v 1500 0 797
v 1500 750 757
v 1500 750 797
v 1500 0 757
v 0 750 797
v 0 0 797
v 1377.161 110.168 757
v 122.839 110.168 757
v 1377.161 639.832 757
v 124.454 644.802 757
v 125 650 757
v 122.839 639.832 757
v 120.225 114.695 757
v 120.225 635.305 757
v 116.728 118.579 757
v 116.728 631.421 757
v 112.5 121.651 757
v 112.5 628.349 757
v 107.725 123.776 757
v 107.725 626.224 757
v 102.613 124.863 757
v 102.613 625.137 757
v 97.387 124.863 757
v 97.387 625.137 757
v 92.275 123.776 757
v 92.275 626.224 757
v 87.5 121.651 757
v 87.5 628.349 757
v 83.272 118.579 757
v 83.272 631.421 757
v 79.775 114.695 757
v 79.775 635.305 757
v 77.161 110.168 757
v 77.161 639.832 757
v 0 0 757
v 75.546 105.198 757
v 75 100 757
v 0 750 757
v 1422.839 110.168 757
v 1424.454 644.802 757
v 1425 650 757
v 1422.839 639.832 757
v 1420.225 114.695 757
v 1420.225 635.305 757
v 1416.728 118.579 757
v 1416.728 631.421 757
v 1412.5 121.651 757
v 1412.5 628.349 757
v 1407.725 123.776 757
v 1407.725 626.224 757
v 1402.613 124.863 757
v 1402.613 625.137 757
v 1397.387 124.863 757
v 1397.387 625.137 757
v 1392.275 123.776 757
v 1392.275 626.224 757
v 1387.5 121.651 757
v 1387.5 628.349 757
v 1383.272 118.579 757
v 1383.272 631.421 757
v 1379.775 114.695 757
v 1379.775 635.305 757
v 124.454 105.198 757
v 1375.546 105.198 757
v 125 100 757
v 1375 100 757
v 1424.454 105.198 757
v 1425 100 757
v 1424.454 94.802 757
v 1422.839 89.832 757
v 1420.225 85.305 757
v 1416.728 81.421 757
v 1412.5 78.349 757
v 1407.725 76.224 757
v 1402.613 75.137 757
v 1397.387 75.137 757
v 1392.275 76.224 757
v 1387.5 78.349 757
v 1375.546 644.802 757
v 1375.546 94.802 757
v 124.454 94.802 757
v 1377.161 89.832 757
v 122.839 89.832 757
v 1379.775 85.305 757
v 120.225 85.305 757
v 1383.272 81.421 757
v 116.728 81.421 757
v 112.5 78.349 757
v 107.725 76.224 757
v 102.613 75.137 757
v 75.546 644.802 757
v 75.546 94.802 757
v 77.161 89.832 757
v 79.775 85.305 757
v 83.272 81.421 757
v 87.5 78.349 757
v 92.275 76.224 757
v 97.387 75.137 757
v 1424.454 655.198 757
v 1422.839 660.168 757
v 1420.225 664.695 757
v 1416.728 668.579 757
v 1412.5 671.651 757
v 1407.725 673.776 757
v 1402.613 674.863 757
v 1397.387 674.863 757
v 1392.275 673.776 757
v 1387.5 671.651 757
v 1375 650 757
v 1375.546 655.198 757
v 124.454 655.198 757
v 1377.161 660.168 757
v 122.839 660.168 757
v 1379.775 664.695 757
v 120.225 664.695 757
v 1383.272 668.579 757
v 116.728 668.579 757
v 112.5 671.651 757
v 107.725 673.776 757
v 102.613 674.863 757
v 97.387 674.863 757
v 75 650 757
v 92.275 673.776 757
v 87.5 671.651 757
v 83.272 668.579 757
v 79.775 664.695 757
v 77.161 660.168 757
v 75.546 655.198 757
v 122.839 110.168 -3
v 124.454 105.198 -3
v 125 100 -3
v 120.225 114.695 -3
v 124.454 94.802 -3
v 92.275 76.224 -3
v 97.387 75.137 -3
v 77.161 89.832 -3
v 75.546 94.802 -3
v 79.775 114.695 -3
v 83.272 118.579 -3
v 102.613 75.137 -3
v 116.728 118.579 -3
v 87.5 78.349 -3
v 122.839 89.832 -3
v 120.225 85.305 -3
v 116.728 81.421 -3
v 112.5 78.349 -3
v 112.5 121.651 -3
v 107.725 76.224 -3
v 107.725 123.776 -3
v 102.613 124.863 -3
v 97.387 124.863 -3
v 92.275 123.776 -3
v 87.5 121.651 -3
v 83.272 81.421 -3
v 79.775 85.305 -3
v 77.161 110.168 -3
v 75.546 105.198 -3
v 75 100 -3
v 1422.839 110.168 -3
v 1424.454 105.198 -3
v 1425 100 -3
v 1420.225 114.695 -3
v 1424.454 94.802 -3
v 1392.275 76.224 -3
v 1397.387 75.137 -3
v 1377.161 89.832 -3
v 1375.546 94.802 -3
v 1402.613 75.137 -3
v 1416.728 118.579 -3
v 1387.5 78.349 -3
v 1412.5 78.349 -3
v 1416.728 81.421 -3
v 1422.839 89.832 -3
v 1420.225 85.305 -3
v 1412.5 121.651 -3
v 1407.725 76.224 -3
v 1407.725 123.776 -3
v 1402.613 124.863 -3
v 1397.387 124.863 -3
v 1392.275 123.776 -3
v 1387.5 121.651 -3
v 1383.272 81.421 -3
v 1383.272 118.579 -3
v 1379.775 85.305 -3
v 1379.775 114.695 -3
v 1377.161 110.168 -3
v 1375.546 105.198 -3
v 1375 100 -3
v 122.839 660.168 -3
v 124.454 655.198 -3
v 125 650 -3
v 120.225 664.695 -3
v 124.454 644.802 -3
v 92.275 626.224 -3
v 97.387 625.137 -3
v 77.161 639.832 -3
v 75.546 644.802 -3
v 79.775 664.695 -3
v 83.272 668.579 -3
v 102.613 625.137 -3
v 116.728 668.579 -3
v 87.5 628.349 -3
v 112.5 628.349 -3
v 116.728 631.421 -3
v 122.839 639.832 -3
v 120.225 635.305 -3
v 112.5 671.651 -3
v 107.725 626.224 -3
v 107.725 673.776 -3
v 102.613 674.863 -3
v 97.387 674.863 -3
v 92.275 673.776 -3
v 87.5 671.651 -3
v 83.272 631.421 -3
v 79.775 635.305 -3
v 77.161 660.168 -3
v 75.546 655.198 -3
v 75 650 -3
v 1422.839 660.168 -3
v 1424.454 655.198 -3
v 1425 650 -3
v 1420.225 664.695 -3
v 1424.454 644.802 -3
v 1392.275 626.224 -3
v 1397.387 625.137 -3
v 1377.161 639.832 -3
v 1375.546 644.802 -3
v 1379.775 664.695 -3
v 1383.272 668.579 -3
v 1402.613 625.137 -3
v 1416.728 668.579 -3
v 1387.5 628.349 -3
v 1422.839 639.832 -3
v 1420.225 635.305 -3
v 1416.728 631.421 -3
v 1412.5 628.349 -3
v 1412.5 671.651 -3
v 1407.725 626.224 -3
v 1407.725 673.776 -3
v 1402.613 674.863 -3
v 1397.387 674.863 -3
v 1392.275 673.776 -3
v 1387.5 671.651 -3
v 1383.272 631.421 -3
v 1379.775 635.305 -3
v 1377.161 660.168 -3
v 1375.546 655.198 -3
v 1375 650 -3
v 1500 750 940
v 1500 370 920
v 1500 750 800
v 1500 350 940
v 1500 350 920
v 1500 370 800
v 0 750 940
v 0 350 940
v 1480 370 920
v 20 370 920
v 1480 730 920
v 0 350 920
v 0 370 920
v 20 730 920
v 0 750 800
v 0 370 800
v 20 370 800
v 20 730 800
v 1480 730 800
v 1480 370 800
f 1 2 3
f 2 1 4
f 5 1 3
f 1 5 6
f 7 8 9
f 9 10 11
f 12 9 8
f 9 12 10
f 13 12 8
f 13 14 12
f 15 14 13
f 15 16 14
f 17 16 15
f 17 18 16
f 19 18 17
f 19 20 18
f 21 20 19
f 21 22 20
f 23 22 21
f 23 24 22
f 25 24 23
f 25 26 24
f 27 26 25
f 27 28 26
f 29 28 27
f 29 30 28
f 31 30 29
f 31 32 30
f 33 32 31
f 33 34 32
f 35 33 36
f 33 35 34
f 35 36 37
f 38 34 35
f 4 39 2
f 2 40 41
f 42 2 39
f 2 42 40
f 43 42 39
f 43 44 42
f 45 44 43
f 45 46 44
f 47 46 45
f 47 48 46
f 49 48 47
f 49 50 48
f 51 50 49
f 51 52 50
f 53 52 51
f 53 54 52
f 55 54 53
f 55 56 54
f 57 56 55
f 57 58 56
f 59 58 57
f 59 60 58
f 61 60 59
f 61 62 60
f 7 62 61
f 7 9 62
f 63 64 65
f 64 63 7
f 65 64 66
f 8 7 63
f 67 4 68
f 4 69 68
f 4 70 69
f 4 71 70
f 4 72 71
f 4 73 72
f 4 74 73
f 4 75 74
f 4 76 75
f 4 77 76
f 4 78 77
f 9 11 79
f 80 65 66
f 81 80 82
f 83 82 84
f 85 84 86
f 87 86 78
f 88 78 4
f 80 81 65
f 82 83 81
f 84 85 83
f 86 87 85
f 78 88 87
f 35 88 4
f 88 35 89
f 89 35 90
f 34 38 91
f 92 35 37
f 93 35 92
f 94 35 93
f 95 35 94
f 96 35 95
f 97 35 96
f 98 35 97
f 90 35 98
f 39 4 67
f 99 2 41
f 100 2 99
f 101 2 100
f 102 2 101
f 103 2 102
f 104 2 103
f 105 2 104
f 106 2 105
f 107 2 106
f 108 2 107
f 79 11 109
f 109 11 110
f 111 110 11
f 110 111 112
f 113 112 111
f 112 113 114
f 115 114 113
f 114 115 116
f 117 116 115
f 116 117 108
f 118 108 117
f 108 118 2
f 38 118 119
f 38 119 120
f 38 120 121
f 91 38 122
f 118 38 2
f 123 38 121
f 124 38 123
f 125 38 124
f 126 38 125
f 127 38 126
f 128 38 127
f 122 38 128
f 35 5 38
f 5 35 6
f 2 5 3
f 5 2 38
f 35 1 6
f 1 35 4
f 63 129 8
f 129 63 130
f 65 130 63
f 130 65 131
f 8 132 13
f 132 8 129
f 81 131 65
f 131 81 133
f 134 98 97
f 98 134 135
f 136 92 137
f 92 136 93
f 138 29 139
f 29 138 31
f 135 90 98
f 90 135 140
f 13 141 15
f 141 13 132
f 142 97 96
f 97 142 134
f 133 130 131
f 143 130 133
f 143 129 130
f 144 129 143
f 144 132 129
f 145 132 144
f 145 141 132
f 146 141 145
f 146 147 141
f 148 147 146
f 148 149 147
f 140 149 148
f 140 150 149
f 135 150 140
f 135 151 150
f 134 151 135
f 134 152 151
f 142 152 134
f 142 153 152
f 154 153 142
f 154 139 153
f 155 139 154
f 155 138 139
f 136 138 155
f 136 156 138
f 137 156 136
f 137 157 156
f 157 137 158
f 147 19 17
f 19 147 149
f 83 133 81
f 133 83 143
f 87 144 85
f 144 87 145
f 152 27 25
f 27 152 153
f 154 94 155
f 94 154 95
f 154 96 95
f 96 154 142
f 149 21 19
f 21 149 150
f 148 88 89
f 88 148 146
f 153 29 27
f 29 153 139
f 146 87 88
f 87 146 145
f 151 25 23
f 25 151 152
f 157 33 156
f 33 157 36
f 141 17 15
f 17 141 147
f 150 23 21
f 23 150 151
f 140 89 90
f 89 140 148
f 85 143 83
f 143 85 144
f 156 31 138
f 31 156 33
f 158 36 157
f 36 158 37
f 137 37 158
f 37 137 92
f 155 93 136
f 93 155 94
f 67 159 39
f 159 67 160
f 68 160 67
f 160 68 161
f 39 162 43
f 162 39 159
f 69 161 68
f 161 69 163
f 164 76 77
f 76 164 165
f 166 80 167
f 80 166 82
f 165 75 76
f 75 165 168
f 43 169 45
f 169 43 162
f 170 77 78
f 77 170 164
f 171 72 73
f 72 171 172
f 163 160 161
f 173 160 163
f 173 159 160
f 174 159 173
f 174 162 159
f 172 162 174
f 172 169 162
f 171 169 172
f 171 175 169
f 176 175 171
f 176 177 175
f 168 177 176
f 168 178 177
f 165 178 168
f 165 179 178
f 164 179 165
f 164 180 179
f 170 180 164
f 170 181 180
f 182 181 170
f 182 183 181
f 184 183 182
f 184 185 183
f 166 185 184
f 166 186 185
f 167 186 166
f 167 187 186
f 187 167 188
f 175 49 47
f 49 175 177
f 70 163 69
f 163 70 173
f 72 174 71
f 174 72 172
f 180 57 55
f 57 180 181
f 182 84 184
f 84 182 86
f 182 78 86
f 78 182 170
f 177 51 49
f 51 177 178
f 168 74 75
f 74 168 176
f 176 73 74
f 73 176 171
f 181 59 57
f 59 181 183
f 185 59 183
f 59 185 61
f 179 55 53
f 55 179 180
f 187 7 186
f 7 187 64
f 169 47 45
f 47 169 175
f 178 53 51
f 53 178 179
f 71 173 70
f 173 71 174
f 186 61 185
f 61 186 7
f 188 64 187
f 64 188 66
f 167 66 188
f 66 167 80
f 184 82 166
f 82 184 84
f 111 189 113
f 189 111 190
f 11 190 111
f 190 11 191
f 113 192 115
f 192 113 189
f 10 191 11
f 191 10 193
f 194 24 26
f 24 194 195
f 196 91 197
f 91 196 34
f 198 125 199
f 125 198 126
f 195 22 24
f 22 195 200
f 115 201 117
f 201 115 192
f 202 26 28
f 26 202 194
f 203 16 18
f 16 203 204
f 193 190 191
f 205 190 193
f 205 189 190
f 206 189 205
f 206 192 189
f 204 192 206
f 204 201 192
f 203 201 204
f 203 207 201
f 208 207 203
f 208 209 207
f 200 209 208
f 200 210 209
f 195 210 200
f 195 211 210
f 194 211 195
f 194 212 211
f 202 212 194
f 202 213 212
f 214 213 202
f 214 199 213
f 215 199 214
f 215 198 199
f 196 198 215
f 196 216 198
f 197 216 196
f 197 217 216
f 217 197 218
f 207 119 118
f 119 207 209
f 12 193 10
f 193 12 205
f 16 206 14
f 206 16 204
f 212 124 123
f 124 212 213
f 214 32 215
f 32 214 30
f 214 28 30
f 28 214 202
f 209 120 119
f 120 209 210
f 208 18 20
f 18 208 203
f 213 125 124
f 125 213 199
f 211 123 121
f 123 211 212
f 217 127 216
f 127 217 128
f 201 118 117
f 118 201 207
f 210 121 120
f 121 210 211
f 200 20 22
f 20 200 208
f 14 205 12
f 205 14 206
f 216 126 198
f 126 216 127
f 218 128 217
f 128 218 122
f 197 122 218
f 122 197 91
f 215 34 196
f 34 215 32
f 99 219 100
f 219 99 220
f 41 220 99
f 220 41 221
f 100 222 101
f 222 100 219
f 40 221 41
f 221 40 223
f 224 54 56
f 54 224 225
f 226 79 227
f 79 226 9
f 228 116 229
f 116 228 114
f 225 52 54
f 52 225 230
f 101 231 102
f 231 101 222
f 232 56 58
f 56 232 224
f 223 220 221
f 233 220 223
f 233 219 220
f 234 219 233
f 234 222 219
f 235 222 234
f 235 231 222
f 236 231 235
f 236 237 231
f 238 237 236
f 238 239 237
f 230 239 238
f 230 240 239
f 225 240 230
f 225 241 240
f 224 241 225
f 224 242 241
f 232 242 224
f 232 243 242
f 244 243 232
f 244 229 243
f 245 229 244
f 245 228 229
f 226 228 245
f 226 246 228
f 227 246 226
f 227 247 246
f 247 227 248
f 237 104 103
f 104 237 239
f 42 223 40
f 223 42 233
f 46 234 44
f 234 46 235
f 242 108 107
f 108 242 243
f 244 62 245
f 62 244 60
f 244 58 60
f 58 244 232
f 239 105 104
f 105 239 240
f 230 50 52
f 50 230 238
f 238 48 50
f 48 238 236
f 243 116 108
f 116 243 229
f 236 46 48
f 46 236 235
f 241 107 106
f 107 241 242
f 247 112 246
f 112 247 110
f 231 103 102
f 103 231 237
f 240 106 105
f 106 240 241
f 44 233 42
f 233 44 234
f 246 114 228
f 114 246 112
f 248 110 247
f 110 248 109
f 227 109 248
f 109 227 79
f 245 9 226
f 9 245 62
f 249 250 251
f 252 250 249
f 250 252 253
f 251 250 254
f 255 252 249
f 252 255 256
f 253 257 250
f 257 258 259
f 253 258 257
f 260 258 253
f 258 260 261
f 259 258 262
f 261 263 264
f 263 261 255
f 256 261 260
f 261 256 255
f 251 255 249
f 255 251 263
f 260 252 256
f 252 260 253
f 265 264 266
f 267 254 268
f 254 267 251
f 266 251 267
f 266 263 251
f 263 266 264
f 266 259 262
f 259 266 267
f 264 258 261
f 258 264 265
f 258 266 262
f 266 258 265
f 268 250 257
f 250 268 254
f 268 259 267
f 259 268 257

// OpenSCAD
// 
// Tablette pour écrans à poser sur une table
// Screen tablet to put on a table
// 
// Author:         sandrock@sandrock.fr
// Public license: none
// Copyright:      sandrock, all rights reserved
// 

// input variables
// suffixes are T̲hickness, L̲ength, H_eight, R_adius
// millimeters

// table configuration
tableX =       1500; // mm. table length
tableY =       750;  // mm. table deepness
tableT =       40;   // mm. tabletop thixkness
tableH =       800;  // mm. table height
tableFootR =   25;   // mm. table feet radius

// tablet configuration
tabletX = tableX;
tabletY =      400; // mm. tablet deepness
tabletT =      20;  // mm. tablet parts thickness
tabletH =      100+tableT; // mm. tablet height (under)

// view configuration
// how much to explode the parts?
explode =      0; // [0:0.05:1]
showTable =    1; // [0,1]
explodeL =     200; // mm

groundColor = [070/255, 070/255, 070/255, 0.75];

// draw ground
color(groundColor)
translate([-tableX, -tableX*1.5, 0])
%square(tableX*3, false);

// draw table
if (showTable) {
  translate([0, 0, -3]) {
    drawTable();
  }
}

// draw tablet
translate([0, 0, tableH]) {
    translate([0, 0, explode * explodeL]) {
        drawTablet();
    }
}


module drawTablet() {
    // top
    translate([0, tableY-tabletY, tabletH-tabletT]) 
    cube([tabletX, tabletY, tabletT]);

    // back
    translate([0, tableY-tabletT, 0]) 
    explode(0, 1, -.2)
    cube([tabletX, tabletT, tabletH-tabletT]);

    // side 1
    let(sideL = tabletY*.9)
    translate([tabletT, tableY-tabletT-sideL, 0]) 
    rotate(90, [0,0,1])
    explode(0, 1, -.2)
    cube([sideL, tabletT, tabletH-tabletT]);

    // side 1
    let(sideL = tabletY*.9)
    translate([tableX, tableY-tabletT-sideL, 0]) 
    rotate(90, [0,0,1])
    explode(0, -1, -.2)
    cube([sideL, tabletT, tabletH-tabletT]);

    // TODO: round top edges
    // TODO: top holes
    // TODO: bottom holes
    // TODO: screws
}

module drawTable() {
    color("#bfb493") {
        // top
        translate([0, 0, tableH-tableT]) 
        cube([tableX, tableY, tableT]);

        // feet
        translate([tableFootR*4, tableFootR*4, 0]) 
        cylinder(tableH-tableT, tableFootR, tableFootR);
        translate([tableX-tableFootR*4, tableFootR*4, 0]) 
        cylinder(tableH-tableT, tableFootR, tableFootR);
        translate([tableFootR*4, tableY-tableFootR*4, 0]) 
        cylinder(tableH-tableT, tableFootR, tableFootR);
        translate([tableX-tableFootR*4, tableY-tableFootR*4, 0]) 
        cylinder(tableH-tableT, tableFootR, tableFootR);
    }
}


module explode(x, y, z) {
    let (v = explode * explodeL)
        translate([x * v, y * v, z * v])
            children();
}
